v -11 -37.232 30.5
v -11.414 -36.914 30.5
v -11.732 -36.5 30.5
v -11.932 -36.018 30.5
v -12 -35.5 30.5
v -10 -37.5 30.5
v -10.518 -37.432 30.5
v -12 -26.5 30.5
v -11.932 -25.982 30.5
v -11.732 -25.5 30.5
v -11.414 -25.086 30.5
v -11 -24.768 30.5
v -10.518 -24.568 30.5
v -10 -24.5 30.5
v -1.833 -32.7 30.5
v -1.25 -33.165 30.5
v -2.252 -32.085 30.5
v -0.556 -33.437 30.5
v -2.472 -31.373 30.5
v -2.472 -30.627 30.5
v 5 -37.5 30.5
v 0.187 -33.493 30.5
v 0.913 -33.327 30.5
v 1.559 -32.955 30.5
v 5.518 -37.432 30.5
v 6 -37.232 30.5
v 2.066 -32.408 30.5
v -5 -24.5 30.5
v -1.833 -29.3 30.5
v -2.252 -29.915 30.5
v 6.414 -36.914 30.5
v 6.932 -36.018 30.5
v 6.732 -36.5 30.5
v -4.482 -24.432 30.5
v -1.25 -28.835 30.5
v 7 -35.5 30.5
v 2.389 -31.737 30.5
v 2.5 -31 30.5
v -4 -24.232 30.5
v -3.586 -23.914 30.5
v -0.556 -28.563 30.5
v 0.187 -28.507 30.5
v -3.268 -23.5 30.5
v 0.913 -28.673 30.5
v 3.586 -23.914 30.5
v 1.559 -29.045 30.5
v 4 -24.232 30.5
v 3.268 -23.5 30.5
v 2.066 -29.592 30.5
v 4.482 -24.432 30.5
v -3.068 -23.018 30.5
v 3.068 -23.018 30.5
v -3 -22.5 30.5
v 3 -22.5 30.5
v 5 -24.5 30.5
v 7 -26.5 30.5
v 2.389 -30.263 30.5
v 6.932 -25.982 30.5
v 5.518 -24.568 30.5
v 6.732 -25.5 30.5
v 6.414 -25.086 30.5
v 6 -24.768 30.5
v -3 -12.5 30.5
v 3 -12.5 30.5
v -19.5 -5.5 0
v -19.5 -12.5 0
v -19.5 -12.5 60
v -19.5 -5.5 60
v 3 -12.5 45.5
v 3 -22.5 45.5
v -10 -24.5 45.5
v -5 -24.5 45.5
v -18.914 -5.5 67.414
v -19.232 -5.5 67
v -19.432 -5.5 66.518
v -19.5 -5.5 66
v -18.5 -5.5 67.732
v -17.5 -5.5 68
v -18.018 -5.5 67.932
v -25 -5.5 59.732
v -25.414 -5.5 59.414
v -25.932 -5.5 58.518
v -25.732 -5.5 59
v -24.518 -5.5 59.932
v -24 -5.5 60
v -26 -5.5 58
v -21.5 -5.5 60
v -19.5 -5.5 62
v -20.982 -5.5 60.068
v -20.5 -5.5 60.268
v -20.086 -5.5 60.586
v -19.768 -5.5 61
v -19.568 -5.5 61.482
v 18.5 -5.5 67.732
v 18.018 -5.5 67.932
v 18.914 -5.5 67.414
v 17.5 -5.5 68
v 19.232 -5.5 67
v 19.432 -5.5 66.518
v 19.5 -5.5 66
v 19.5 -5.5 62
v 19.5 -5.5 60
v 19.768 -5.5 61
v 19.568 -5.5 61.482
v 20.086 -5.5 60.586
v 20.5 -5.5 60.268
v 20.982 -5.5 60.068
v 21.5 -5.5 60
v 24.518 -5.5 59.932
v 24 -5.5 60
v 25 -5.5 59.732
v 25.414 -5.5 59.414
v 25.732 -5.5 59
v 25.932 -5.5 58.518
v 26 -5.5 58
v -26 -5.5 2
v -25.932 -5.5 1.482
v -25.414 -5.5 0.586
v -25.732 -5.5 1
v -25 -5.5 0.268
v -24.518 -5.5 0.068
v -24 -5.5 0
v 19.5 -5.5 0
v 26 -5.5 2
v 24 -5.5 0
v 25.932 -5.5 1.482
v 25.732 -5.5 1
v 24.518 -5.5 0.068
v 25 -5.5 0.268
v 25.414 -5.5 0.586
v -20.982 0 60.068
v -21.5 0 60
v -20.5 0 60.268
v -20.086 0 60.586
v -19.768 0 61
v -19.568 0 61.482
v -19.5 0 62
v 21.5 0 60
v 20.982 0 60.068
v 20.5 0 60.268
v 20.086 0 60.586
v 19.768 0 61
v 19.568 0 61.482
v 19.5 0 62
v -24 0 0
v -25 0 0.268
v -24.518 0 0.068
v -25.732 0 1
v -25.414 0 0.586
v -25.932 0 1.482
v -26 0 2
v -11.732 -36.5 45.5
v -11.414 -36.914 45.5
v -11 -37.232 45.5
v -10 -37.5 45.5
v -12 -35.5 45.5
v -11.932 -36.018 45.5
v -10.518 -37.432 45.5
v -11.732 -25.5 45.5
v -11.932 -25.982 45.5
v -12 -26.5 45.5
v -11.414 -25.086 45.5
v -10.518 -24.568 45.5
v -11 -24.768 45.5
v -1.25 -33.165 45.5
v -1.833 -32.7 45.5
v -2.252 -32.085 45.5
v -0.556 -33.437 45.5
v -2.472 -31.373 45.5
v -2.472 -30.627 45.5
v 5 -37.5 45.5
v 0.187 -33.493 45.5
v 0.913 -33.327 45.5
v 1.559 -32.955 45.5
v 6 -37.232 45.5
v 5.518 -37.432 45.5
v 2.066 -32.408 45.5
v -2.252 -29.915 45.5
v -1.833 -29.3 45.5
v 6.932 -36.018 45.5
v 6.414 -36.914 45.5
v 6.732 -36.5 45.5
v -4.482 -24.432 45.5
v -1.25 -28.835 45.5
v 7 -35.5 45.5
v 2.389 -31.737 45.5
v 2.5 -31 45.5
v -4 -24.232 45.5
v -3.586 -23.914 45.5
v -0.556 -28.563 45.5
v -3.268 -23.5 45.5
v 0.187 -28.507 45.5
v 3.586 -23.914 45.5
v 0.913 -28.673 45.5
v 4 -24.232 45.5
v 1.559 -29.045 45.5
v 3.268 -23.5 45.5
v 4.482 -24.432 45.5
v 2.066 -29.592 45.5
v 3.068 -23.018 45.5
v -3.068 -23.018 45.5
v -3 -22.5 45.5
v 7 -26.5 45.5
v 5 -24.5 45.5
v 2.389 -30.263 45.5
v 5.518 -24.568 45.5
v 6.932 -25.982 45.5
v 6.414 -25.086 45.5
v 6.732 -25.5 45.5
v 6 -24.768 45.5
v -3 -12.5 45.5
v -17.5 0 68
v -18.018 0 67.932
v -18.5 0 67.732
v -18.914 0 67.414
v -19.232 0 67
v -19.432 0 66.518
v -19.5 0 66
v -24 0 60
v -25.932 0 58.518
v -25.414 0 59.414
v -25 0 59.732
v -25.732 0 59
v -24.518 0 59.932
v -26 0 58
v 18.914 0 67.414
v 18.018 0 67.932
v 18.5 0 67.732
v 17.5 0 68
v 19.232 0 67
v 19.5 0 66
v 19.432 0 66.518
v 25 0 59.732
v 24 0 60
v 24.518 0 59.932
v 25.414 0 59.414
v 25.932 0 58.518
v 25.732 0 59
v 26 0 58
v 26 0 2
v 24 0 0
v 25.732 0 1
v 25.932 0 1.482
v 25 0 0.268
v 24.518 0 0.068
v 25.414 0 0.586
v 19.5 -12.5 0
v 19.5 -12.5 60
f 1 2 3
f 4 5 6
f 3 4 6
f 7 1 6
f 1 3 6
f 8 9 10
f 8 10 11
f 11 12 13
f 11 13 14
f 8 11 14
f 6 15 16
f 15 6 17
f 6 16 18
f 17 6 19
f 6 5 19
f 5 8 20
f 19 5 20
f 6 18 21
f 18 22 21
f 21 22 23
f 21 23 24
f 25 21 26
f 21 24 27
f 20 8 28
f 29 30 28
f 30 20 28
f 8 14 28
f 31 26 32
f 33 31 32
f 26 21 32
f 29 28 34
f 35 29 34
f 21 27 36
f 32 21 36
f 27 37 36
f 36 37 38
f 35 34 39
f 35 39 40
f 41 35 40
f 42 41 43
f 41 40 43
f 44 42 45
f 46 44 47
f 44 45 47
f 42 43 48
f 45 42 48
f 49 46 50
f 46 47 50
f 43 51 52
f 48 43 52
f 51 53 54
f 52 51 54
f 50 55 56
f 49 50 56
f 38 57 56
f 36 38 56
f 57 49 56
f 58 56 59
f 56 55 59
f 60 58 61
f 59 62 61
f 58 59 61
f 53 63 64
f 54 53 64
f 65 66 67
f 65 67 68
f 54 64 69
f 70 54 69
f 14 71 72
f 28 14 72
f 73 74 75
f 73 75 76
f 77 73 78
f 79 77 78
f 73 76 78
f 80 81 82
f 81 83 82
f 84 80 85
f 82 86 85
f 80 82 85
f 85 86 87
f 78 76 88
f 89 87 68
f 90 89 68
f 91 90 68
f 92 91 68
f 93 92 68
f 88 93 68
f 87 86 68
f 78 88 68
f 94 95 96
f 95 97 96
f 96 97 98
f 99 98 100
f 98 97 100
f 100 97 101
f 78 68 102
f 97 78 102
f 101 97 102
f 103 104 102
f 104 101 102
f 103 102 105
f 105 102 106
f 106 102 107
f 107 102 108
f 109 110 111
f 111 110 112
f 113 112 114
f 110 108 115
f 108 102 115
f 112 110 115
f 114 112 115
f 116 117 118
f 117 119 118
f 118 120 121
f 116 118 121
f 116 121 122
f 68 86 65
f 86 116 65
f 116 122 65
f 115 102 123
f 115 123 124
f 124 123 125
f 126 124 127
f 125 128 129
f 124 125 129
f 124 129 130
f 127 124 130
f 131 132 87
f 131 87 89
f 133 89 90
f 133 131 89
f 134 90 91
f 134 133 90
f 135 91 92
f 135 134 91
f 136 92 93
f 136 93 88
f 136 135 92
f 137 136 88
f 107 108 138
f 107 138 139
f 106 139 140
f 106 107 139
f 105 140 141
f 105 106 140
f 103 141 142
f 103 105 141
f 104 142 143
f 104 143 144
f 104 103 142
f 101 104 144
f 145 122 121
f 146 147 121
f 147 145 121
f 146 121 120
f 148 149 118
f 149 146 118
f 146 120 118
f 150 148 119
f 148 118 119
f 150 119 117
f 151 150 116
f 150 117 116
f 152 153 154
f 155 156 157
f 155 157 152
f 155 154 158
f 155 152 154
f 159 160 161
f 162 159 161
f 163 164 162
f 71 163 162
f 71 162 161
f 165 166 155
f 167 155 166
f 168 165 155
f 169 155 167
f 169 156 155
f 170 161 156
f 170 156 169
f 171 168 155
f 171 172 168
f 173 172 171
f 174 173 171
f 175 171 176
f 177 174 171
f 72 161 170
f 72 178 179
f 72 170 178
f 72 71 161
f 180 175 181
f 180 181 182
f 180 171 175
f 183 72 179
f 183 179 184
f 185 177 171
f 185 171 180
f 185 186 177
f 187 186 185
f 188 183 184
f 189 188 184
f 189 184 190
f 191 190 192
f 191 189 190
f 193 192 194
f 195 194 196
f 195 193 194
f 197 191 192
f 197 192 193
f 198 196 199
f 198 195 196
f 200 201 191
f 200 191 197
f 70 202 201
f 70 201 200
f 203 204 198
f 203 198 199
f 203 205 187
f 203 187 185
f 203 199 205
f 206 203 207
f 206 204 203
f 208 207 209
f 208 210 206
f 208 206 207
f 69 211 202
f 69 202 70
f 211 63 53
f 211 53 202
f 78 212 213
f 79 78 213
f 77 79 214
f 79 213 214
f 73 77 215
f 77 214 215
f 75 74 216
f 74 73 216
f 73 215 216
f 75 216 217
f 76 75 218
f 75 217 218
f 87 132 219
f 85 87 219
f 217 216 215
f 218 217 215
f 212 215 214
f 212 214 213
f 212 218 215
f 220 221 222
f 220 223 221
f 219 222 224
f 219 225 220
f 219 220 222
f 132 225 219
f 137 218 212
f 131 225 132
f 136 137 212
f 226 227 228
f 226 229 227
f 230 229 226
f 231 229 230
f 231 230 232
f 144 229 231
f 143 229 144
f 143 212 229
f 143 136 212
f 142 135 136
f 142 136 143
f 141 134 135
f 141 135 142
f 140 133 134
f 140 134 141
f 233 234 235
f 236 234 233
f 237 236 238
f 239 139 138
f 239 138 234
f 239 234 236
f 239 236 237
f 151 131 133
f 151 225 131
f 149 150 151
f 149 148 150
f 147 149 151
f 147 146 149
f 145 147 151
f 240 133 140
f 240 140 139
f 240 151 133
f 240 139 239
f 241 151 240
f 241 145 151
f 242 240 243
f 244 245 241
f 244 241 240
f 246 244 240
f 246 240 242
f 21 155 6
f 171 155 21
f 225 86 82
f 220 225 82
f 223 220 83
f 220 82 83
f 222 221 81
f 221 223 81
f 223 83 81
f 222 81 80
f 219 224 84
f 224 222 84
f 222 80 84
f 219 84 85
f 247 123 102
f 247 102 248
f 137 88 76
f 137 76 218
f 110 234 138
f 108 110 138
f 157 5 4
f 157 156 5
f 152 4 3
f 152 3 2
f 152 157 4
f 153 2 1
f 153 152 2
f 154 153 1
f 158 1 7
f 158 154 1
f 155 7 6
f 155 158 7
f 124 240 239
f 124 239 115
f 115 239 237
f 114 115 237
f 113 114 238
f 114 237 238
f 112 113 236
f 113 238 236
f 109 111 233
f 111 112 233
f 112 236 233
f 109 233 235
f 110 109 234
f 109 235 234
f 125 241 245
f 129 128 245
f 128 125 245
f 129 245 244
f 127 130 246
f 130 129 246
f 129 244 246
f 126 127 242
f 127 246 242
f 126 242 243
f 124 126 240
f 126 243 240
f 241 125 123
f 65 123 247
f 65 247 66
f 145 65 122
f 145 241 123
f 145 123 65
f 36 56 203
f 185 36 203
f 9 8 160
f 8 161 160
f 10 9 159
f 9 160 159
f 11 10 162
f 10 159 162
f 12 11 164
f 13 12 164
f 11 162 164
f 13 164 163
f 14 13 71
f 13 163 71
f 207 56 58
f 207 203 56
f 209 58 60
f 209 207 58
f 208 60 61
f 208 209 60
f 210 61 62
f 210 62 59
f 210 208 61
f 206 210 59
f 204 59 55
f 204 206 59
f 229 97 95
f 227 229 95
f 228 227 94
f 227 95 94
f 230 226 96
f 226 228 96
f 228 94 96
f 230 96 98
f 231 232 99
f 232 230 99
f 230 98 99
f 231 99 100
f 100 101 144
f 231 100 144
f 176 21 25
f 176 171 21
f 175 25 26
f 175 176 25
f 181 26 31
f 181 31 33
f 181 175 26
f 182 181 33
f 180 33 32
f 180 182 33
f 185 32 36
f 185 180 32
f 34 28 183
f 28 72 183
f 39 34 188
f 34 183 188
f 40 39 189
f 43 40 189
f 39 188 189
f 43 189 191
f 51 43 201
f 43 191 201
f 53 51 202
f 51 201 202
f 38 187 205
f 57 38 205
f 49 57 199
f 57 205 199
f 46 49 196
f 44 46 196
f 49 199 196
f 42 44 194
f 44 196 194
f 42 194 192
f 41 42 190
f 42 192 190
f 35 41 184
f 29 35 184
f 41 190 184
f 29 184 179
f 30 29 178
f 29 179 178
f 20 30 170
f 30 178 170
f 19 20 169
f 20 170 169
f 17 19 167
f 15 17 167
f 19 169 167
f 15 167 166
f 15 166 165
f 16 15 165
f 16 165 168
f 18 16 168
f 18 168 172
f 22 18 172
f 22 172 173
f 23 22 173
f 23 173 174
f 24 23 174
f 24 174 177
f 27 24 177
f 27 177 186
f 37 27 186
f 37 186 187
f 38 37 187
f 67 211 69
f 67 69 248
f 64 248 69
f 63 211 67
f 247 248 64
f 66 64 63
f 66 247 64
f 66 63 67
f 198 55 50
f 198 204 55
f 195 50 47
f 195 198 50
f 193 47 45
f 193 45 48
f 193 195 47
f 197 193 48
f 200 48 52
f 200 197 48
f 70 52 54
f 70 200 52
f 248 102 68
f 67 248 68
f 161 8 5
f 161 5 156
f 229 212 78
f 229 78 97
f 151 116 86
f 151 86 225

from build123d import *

# Parameters (mm, degrees)
BOSS_EXTRUDE1_DEPTH = 60
SKETCH2_W           = 39
SKETCH2_H           = 5.5
BOSS_EXTRUDE2_DEPTH = 8
FILLET2_R           = 2
SKETCH3_W           = 6
SKETCH3_H           = 15
BOSS_EXTRUDE3_DEPTH = 12
SKETCH4_W           = 19
SKETCH4_H           = 15
BOSS_EXTRUDE4_DEPTH = 13
FILLET3_R           = 2
SKETCH5_R           = 2.5
CUT_EXTRUDE1_DEPTH  = 65.439894475


# Some blends are built 0.0001 mm under size
with BuildPart() as part:
    # Sketch1 → Boss-Extrude1 (new body)
    with BuildSketch(Plane.XY):
        Polygon((-26, 0), (26, 0), (26, -5.5), (19.5, -5.5), (19.5, -12.5), (-19.5, -12.5), (-19.5, -5.5), (-26, -5.5), align=None)
    extrude(amount=BOSS_EXTRUDE1_DEPTH)

    # Sketch2 → Boss-Extrude2 (add)
    with BuildSketch(Plane.XY.offset(60)):
        with Locations((0, -2.75)):
            Rectangle(SKETCH2_W, SKETCH2_H)
    extrude(amount=BOSS_EXTRUDE2_DEPTH)

    # Fillet2
    # the kernel refuses this fillet: 2 mm, written as the material it adds along each edge
    with BuildSketch(Plane(origin=(-19.5, 0, 60), x_dir=(-1, 0, 0), z_dir=(0, -1, 0)), Plane(origin=(19.5, -5.5, 60), x_dir=(1, 0, 0), z_dir=(0, 1, 0))) as fillet2_piece_1:
        with BuildLine():
            CenterArc((FILLET2_R, -FILLET2_R), FILLET2_R, 90, 90)
            Line((0, -FILLET2_R), (0, 0))
            Line((0, 0), (FILLET2_R, 0))
        make_face()
    extrude(amount=5.5)
    # the kernel refuses this fillet: 2 mm, written as the material it takes off along each edge
    with BuildSketch(Plane(origin=(26, 5, 60), x_dir=(-1, 0, 0), z_dir=(0, -1, 0)), Plane(origin=(-19.5, 5, 68), x_dir=(0, 0, -1), z_dir=(0, -1, 0)), Plane(origin=(-26, -10.5, 0), x_dir=(0, 0, 1), z_dir=(0, 1, 0)), Plane(origin=(26, 5, 0), x_dir=(0, 0, 1), z_dir=(0, -1, 0))) as fillet2_2_piece_1:
        with BuildLine():
            CenterArc((FILLET2_R, FILLET2_R), FILLET2_R, 180, 90)
            Line((0, FILLET2_R), (0, 0))
            Line((0, 0), (FILLET2_R, 0))
        make_face()
    extrude(amount=15.5, mode=Mode.SUBTRACT)
    with BuildSketch(Plane(origin=(-26, -10.5, 60), x_dir=(0, 0, -1), z_dir=(0, 1, 0)), Plane(origin=(19.5, -10.5, 68), x_dir=(-1, 0, 0), z_dir=(0, 1, 0))) as fillet2_2_piece_2:
        with BuildLine():
            CenterArc((FILLET2_R, -FILLET2_R), FILLET2_R, 90, 90)
            Line((0, -FILLET2_R), (0, 0))
            Line((0, 0), (FILLET2_R, 0))
        make_face()
    extrude(amount=15.5, mode=Mode.SUBTRACT)

    # Sketch3 → Boss-Extrude3 (add)
    with BuildSketch(Plane.XZ.offset(12.5)):
        with Locations((0, 38)):
            Rectangle(SKETCH3_W, SKETCH3_H)
    extrude(amount=BOSS_EXTRUDE3_DEPTH)

    # Sketch4 → Boss-Extrude4 (add)
    with BuildSketch(Plane.XZ.offset(24.5)):
        with Locations((-2.5, 38)):
            Rectangle(SKETCH4_W, SKETCH4_H)
    extrude(amount=BOSS_EXTRUDE4_DEPTH)

    # Fillet3
    fillet3_edges = [part.edges().sort_by_distance(p)[0] for p in [
        (7, -24.5, 38),
        (-12, -24.5, 38),
        (7, -37.5, 38),
        (-12, -37.5, 38),
        (3, -24.5, 38),
        (-3, -24.5, 38),
    ]]
    fillet(fillet3_edges, radius=FILLET3_R - 0.0001)  # a hair under: the kernel refuses the full size

    # Sketch5 → Cut-Extrude1 (cut, through all)
    with BuildSketch(Plane.XY.offset(45.5)):
        with Locations((0, -31)):
            Circle(SKETCH5_R)
    extrude(amount=-CUT_EXTRUDE1_DEPTH, mode=Mode.SUBTRACT)


solid = part.part
